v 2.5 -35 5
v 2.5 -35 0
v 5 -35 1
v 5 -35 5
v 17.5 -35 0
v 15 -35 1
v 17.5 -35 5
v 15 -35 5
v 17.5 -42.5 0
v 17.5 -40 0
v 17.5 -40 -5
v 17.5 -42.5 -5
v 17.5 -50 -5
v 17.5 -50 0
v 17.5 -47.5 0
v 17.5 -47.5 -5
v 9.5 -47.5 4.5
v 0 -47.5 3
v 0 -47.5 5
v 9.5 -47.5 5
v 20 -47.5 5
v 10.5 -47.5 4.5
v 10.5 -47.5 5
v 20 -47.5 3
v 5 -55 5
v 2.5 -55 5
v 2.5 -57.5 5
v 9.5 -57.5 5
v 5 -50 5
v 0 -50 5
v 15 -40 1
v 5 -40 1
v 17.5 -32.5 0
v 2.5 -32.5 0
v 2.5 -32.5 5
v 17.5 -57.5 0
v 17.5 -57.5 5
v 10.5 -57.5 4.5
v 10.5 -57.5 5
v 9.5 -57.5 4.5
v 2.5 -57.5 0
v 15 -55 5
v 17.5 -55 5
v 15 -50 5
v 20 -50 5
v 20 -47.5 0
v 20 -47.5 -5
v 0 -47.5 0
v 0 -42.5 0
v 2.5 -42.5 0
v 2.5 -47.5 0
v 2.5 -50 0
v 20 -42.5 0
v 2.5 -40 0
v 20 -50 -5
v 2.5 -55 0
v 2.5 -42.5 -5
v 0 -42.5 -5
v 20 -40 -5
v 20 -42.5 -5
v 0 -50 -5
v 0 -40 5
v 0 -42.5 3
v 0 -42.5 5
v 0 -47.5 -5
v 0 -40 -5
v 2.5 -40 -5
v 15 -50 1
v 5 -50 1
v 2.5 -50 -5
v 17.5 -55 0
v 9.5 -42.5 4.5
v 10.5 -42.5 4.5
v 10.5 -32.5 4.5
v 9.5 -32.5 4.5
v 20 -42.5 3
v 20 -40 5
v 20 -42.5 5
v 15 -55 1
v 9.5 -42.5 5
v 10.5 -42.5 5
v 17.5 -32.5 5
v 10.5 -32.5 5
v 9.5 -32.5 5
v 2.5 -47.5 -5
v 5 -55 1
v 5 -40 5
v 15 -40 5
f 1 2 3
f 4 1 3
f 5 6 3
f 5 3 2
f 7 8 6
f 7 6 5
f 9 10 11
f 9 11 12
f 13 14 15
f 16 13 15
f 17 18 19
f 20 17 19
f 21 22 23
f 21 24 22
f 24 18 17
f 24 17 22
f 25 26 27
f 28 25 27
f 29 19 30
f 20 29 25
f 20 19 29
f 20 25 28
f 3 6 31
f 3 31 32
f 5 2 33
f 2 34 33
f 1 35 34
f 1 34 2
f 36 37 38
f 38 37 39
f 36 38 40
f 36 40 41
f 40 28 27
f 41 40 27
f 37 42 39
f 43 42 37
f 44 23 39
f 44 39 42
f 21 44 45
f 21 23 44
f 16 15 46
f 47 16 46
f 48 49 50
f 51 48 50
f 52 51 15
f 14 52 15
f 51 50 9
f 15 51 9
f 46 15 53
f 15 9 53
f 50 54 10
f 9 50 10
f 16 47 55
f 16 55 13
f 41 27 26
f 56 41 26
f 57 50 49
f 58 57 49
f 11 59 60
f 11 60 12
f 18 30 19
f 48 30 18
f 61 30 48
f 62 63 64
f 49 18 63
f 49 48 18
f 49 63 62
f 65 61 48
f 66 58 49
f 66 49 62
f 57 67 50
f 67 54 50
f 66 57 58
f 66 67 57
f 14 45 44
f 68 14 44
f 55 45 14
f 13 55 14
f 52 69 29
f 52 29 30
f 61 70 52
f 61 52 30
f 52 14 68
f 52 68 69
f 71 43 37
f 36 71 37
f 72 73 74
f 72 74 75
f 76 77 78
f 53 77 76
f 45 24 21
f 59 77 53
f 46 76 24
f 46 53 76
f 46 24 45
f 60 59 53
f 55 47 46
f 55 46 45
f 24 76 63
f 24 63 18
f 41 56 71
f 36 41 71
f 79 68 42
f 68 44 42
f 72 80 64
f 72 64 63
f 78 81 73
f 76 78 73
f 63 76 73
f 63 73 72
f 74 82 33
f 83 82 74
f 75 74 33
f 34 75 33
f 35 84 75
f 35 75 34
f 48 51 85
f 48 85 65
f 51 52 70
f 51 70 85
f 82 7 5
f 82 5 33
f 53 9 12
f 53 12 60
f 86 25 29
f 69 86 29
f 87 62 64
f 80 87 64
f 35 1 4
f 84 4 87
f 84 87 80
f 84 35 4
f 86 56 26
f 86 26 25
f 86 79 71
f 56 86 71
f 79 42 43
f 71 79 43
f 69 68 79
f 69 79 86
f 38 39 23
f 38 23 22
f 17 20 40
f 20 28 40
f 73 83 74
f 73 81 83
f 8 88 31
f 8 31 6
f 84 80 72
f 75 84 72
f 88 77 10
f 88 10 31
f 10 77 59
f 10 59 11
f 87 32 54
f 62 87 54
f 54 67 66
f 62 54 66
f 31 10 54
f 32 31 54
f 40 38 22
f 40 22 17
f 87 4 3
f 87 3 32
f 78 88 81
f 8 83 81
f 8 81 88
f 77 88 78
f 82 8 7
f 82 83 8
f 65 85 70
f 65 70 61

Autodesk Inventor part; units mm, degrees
ref_plane "YZ Plane" through (0, 0, 0) normal (1, 0, 0) x (0, 1, 0)
ref_plane "XZ Plane" through (0, 0, 0) normal (0, 1, 0) x (-1, 0, 0)
ref_plane "XY Plane" through (0, 0, 0) normal (0, 0, 1) x (1, 0, 0)
sketch "Sketch1" plane through (0, 0, 0) normal (0, 0, 1) x (1, 0, 0)
  line L0 (0, 0) -> (20, 0)
  line L1 (20, 0) -> (20, -2.7984)
  line L2 (0, -2.7984) -> (0, 0)
  line L3 (0, 0) -> (20, 0)
  line L4 (20, 0) -> (20, -50)
  line L5 (20, -50) -> (0, -50)
  line L6 (0, -50) -> (0, 0)
  line L7 (0, 0) -> (5, 0)
  line L8 (0, -5) -> (0, 0)
  circle A0 centre (5, -5) radius 1.651
  line L9 (20, 0) -> (15, 0)
  line L10 (15, -5) -> (20, -5)
  line L11 (20, -5) -> (20, 0)
  circle A1 centre (15, -5) radius 1.651
  dimension "d1" = 20
  dimension "d2" = 50
  dimension "d6" = 5
  dimension "d7" = 5
  dimension "d9" = 3.302
extrude "Extrusion1" add sketch "Sketch1" along normal blind 5
sketch "Sketch2" plane through (0, 0, 5) normal (0, 0, 1) x (1, 0, 0)
  line L0 (20, 0) -> (0, 0) projected
  line L1 (10, 0) -> (5, 0)
  line L2 (5, 0) -> (5, 5)
  line L3 (5, 5) -> (10, 5)
  line L4 (10, 5) -> (10, 0)
  line L5 (10, 5) -> (2.5, 5)
  line L6 (2.5, 5) -> (2.5, 7.5)
  line L7 (2.5, 7.5) -> (10, 7.5)
  line L8 (10, 7.5) -> (10, 5)
  line L9 (2.5, 7.5) -> (17.5, 7.5)
  line L10 (17.5, 7.5) -> (17.5, 5)
  line L11 (17.5, 5) -> (2.5, 5)
  line L12 (2.5, 5) -> (2.5, 7.5)
  line L13 (10, 5) -> (15, 5)
  line L14 (15, 5) -> (15, 0)
  line L15 (15, 0) -> (10, 0)
  line L16 (10, 0) -> (10, 5)
  dimension "d12" = 5
  dimension "d13" = 5
  dimension "d14" = 7.5
  dimension "d15" = 2.5
  dimension "d16" = 15
  dimension "d17" = 2.5
  dimension "d18" = 5
  dimension "d19" = 5
extrude "Extrusion2" add sketch "Sketch2" against normal blind 5
sketch "Sketch3" plane through (0, 0, 0) normal (0, 0, -1) x (-1, 0, 0)
  line L0 (-5, 0) -> (-5, 5) projected
  line L1 (-5, 0) -> (-15, 0)
  line L2 (-15, 0) -> (-15, 5)
  line L3 (-15, 5) -> (-5, 5)
  line L4 (-5, 5) -> (-5, 0)
  point P0 (0, 0)
extrude "Extrusion3" cut sketch "Sketch3" against normal blind 1
sketch "Sketch4" plane through (0, 0, 0) normal (0, 0, -1) x (-1, 0, 0)
  line L0 (-5, 0) -> (0, 0) projected
  line L1 (-20, -50) -> (0, -50) projected
  line L2 (0, 0) -> (-20, 0)
  line L3 (-20, 0) -> (-20, -50)
  line L4 (-20, -50) -> (0, -50)
  line L5 (0, -50) -> (0, 0)
  line L6 (0, -50) -> (-5, -50)
  line L7 (-5, -50) -> (-5, -30)
  line L8 (-5, -30) -> (0, -30)
  line L9 (0, -30) -> (0, -50)
  line L10 (0, -50) -> (0, 0) projected
  line L11 (0, -50) -> (-5, -50)
  line L12 (-5, -50) -> (-5, -30)
  line L13 (-5, -30) -> (0, -30)
  line L14 (0, -30) -> (0, -50)
  line L15 (0, -50) -> (-20, -50)
  line L16 (-20, -50) -> (-20, -45)
  line L17 (-20, -45) -> (0, -45)
  line L18 (0, -45) -> (0, -50)
  dimension "d28" = 5
  dimension "d29" = 20
  dimension "d30" = 5
  dimension "d31" = 20
  dimension "d32" = 20
  dimension "d33" = 5
extrude "Extrusion4" add sketch "Sketch4" along normal blind 15 contours L17 L7 L1 L3 | L5 L1 L7 L17
sketch "Sketch5" plane through (0, 0, 5) normal (0, 0, 1) x (1, 0, 0)
  line L0 (20, -50) -> (20, 0) projected
  line L1 (20, 0) -> (0, 0)
  line L2 (0, 0) -> (0, -50)
  line L3 (0, -50) -> (20, -50)
  line L4 (20, -50) -> (20, 0)
  line L5 (10, -50) -> (15, -50)
  line L6 (15, -50) -> (15, -55)
  line L7 (15, -55) -> (10, -55)
  line L8 (10, -55) -> (10, -50)
  line L9 (15, -55) -> (5, -55)
  line L10 (5, -55) -> (5, -50)
  line L11 (5, -50) -> (15, -50)
  line L12 (15, -50) -> (15, -55)
  line L13 (10, -55) -> (17.5, -55)
  line L14 (17.5, -55) -> (17.5, -57.5)
  line L15 (17.5, -57.5) -> (10, -57.5)
  line L16 (10, -57.5) -> (10, -55)
  line L17 (17.5, -57.5) -> (2.5, -57.5)
  line L18 (2.5, -57.5) -> (2.5, -55)
  line L19 (2.5, -55) -> (17.5, -55)
  line L20 (17.5, -55) -> (17.5, -57.5)
  dimension "d36" = 5
  dimension "d37" = 5
  dimension "d38" = 10
  dimension "d39" = 5
  dimension "d40" = 7.5
  dimension "d41" = 2.5
  dimension "d42" = 15
  dimension "d43" = 2.5
extrude "Extrusion5" add sketch "Sketch5" against normal blind 5 contours L6 L7 L8 L3 | L8 L9 L10 L3 | L13 L14 L15 L16 L7 | L16 L17 L18 L19 L9
sketch "Sketch6" plane through (0, 0, 0) normal (0, 0, -1) x (-1, 0, 0)
  line L0 (-5, -55) -> (-5, -50) projected
  line L1 (-15, -50) -> (-5, -50) projected
  line L2 (-5, -55) -> (-15, -55)
  line L3 (-15, -55) -> (-15, -50)
  line L4 (-15, -50) -> (-5, -50)
  line L5 (-5, -50) -> (-5, -55)
  point P0 (0, 0)
extrude "Extrusion6" cut sketch "Sketch6" against normal blind 1
sketch "Sketch8" plane through (0, -45, 0) normal (0, 1, 0) x (1, 0, 0)
  line L0 (0, 15) -> (20, 15) projected
  line L1 (0, 15) -> (20, 15)
  line L2 (20, 15) -> (20, 0)
  line L3 (20, 0) -> (0, 0)
  line L4 (0, 0) -> (0, 15)
  line L5 (0, 0) -> (0, 15) projected
  line L6 (0, 7.5) -> (20, 7.5)
  line L7 (20, 0) -> (20, 15) projected
  line L8 (20, 0) -> (0, 15)
  line L9 (20, 15) -> (0, 0)
  line L10 (10, 7.5) -> (10, 15)
  line L11 (10, 7.5) -> (10, 0)
  line L12 (10, 7.5) -> (0, 0)
  line L13 (10, 7.5) -> (20, 0)
  line L14 (10, 7.5) -> (0, 15)
  line L15 (10, 7.5) -> (20, 15)
  circle A0 centre (5, 3.75) radius 1.651
  circle A1 centre (15, 3.75) radius 1.651
  circle A2 centre (15, 11.25) radius 1.651
  circle A3 centre (5, 11.25) radius 1.651
  dimension "d48" = 3.302
  dimension "d49" = 3.302
  dimension "d50" = 3.302
  dimension "d51" = 3.302
extrude "Extrusion7" cut sketch "Sketch8" against normal blind 5 contours A3 L8 | L8 A3 | A2 L9 | L9 A2 | A1 L8 | L8 A1 | A0 L9 | L9 A0
sketch "Sketch9" plane through (0, 0, 0) normal (0, 0, -1) x (-1, 0, 0)
  line L0 (6.3074, -39.8098) -> (-37.7059, -39.8098)
  line L1 (-37.7059, -39.8098) -> (-37.7059, -53.6211)
  line L2 (-37.7059, -53.6211) -> (6.3074, -53.6211)
  line L3 (6.3074, -53.6211) -> (6.3074, -39.8098)
  point P0 (0, 0)
extrude "Extrusion8" cut sketch "Sketch9" along normal blind 100
sketch "Sketch10" plane through (0, 0, 0) normal (0, 0, -1) x (-1, 0, 0)
  line L0 (0, 0) -> (0, -50) projected
  line L1 (-20, -50) -> (-20, 0) projected
  line L2 (0, -50) -> (-20, -50)
  line L3 (-20, -50) -> (-20, -40)
  line L4 (-20, -40) -> (0, -40)
  line L5 (0, -40) -> (0, -50)
  line L6 (-20, -40) -> (0, -40)
  line L7 (0, -40) -> (0, 19.6469)
  line L8 (0, 19.6469) -> (-20, 19.6469)
  line L9 (-20, 19.6469) -> (-20, -40)
  dimension "d56" = 10
extrude "Extrusion9" cut sketch "Sketch10" against normal blind 100 contours L0 L4 L1 L9 L8 L7
sketch "Sketch11" plane through (0, 0, 5) normal (0, 0, 1) x (1, 0, 0)
  line L0 (0, -40) -> (20, -40) projected
  line L1 (10, -40) -> (15, -40)
  line L2 (15, -40) -> (15, -35)
  line L3 (15, -35) -> (10, -35)
  line L4 (10, -35) -> (10, -40)
  line L5 (10, -35) -> (17.5, -35)
  line L6 (17.5, -35) -> (17.5, -32.5)
  line L7 (17.5, -32.5) -> (10, -32.5)
  line L8 (10, -32.5) -> (10, -35)
  line L9 (17.5, -32.5) -> (2.5, -32.5)
  line L10 (2.5, -32.5) -> (2.5, -35)
  line L11 (2.5, -35) -> (17.5, -35)
  line L12 (17.5, -35) -> (17.5, -32.5)
  line L13 (10, -35) -> (5, -35)
  line L14 (5, -35) -> (5, -40)
  line L15 (5, -40) -> (10, -40)
  line L16 (10, -40) -> (10, -35)
  point P0 (0, 0)
  dimension "d59" = 5
  dimension "d60" = 5
  dimension "d61" = 7.5
  dimension "d62" = 2.5
  dimension "d63" = 15
  dimension "d64" = 2.5
  dimension "d65" = 5
  dimension "d66" = 5
extrude "Extrusion10" add sketch "Sketch11" against normal blind 5
sketch "Sketch12" plane through (0, 0, 0) normal (0, 0, -1) x (-1, 0, 0)
  line L0 (-15, -35) -> (-15, -40) projected
  line L1 (-5, -40) -> (0, -40) projected
  line L2 (-15, -35) -> (-5, -35)
  line L3 (-5, -35) -> (-5, -40)
  line L4 (-5, -40) -> (-15, -40)
  line L5 (-15, -40) -> (-15, -35)
  point P0 (0, 0)
extrude "Extrusion11" cut sketch "Sketch12" against normal blind 1
sketch "Sketch13" plane through (20, -50, 5) normal (1, 0, 0) x (0, 0, -1)
  line L0 (5, 10) -> (0, 10) projected
  line L1 (0, 0) -> (5, 0) projected
  line L2 (5, 10) -> (0, 10)
  line L3 (0, 10) -> (0, 0)
  line L4 (0, 0) -> (5, 0)
  line L5 (5, 0) -> (5, 10)
  line L6 (0, 0) -> (0, 10) projected
  line L7 (0, 5) -> (2, 5)
  line L8 (2, 5) -> (2, 2.5)
  line L9 (2, 2.5) -> (0, 2.5)
  line L10 (0, 2.5) -> (0, 5)
  line L11 (2, 2.5) -> (0, 2.5)
  line L12 (0, 2.5) -> (0, 7.5)
  line L13 (0, 7.5) -> (2, 7.5)
  line L14 (2, 7.5) -> (2, 2.5)
  point P0 (5, 50)
  dimension "d71" = 2
  dimension "d72" = 2.5
  dimension "d73" = 5
extrude "Extrusion12" cut sketch "Sketch13" against normal blind 20 contours L13 L14 L7 L3 | L7 L8 L9 L3
sketch "Sketch14" plane through (0, 0, 0) normal (0, 0, -1) x (-1, 0, 0)
  line L0 (-20, -40) -> (-15, -40) projected
  line L1 (-20, -40) -> (-17.5, -40)
  line L2 (-17.5, -40) -> (-17.5, -42.5)
  line L3 (-17.5, -42.5) -> (-20, -42.5)
  line L4 (-20, -42.5) -> (-20, -40)
  line L5 (-15, -50) -> (-20, -50) projected
  line L6 (-20, -50) -> (-17.5, -50)
  line L7 (-17.5, -50) -> (-17.5, -47.5)
  line L8 (-17.5, -47.5) -> (-20, -47.5)
  line L9 (-20, -47.5) -> (-20, -50)
  line L10 (0, -50) -> (0, -40) projected
  line L11 (0, -40) -> (-2.5, -40)
  line L12 (-2.5, -40) -> (-2.5, -42.5)
  line L13 (-2.5, -42.5) -> (0, -42.5)
  line L14 (0, -42.5) -> (0, -40)
  line L15 (0, -50) -> (-2.5, -50)
  line L16 (-2.5, -50) -> (-2.5, -47.5)
  line L17 (-2.5, -47.5) -> (0, -47.5)
  line L18 (0, -47.5) -> (0, -50)
  point P0 (0, 0)
  dimension "d76" = 2.5
  dimension "d77" = 2.5
  dimension "d78" = 2.5
  dimension "d79" = 2.5
  dimension "d80" = 2.5
  dimension "d81" = 2.5
  dimension "d82" = 2.5
  dimension "d83" = 2.5
extrude "Extrusion13" add sketch "Sketch14" along normal blind 5
sketch "Sketch15" plane through (2.5, -57.5, 5) normal (0, -1, 0) x (1, 0, 0)
  line L0 (17.5, 0) -> (-2.5, 0) projected
  line L1 (7.5, 0) -> (7, 0)
  line L2 (7, 0) -> (7, -0.5)
  line L3 (7, -0.5) -> (7.5, -0.5)
  line L4 (7.5, -0.5) -> (7.5, 0)
  line L5 (7, 0) -> (8, 0)
  line L6 (8, 0) -> (8, -0.5)
  line L7 (8, -0.5) -> (7, -0.5)
  line L8 (7, -0.5) -> (7, 0)
  point P0 (-2.5, -5)
  dimension "d86" = 0.5
  dimension "d87" = 0.5
  dimension "d88" = 1
  dimension "d89" = 0.5
extrude "Extrusion14" cut sketch "Sketch15" against normal blind 500
properties part number "CableGuide"
